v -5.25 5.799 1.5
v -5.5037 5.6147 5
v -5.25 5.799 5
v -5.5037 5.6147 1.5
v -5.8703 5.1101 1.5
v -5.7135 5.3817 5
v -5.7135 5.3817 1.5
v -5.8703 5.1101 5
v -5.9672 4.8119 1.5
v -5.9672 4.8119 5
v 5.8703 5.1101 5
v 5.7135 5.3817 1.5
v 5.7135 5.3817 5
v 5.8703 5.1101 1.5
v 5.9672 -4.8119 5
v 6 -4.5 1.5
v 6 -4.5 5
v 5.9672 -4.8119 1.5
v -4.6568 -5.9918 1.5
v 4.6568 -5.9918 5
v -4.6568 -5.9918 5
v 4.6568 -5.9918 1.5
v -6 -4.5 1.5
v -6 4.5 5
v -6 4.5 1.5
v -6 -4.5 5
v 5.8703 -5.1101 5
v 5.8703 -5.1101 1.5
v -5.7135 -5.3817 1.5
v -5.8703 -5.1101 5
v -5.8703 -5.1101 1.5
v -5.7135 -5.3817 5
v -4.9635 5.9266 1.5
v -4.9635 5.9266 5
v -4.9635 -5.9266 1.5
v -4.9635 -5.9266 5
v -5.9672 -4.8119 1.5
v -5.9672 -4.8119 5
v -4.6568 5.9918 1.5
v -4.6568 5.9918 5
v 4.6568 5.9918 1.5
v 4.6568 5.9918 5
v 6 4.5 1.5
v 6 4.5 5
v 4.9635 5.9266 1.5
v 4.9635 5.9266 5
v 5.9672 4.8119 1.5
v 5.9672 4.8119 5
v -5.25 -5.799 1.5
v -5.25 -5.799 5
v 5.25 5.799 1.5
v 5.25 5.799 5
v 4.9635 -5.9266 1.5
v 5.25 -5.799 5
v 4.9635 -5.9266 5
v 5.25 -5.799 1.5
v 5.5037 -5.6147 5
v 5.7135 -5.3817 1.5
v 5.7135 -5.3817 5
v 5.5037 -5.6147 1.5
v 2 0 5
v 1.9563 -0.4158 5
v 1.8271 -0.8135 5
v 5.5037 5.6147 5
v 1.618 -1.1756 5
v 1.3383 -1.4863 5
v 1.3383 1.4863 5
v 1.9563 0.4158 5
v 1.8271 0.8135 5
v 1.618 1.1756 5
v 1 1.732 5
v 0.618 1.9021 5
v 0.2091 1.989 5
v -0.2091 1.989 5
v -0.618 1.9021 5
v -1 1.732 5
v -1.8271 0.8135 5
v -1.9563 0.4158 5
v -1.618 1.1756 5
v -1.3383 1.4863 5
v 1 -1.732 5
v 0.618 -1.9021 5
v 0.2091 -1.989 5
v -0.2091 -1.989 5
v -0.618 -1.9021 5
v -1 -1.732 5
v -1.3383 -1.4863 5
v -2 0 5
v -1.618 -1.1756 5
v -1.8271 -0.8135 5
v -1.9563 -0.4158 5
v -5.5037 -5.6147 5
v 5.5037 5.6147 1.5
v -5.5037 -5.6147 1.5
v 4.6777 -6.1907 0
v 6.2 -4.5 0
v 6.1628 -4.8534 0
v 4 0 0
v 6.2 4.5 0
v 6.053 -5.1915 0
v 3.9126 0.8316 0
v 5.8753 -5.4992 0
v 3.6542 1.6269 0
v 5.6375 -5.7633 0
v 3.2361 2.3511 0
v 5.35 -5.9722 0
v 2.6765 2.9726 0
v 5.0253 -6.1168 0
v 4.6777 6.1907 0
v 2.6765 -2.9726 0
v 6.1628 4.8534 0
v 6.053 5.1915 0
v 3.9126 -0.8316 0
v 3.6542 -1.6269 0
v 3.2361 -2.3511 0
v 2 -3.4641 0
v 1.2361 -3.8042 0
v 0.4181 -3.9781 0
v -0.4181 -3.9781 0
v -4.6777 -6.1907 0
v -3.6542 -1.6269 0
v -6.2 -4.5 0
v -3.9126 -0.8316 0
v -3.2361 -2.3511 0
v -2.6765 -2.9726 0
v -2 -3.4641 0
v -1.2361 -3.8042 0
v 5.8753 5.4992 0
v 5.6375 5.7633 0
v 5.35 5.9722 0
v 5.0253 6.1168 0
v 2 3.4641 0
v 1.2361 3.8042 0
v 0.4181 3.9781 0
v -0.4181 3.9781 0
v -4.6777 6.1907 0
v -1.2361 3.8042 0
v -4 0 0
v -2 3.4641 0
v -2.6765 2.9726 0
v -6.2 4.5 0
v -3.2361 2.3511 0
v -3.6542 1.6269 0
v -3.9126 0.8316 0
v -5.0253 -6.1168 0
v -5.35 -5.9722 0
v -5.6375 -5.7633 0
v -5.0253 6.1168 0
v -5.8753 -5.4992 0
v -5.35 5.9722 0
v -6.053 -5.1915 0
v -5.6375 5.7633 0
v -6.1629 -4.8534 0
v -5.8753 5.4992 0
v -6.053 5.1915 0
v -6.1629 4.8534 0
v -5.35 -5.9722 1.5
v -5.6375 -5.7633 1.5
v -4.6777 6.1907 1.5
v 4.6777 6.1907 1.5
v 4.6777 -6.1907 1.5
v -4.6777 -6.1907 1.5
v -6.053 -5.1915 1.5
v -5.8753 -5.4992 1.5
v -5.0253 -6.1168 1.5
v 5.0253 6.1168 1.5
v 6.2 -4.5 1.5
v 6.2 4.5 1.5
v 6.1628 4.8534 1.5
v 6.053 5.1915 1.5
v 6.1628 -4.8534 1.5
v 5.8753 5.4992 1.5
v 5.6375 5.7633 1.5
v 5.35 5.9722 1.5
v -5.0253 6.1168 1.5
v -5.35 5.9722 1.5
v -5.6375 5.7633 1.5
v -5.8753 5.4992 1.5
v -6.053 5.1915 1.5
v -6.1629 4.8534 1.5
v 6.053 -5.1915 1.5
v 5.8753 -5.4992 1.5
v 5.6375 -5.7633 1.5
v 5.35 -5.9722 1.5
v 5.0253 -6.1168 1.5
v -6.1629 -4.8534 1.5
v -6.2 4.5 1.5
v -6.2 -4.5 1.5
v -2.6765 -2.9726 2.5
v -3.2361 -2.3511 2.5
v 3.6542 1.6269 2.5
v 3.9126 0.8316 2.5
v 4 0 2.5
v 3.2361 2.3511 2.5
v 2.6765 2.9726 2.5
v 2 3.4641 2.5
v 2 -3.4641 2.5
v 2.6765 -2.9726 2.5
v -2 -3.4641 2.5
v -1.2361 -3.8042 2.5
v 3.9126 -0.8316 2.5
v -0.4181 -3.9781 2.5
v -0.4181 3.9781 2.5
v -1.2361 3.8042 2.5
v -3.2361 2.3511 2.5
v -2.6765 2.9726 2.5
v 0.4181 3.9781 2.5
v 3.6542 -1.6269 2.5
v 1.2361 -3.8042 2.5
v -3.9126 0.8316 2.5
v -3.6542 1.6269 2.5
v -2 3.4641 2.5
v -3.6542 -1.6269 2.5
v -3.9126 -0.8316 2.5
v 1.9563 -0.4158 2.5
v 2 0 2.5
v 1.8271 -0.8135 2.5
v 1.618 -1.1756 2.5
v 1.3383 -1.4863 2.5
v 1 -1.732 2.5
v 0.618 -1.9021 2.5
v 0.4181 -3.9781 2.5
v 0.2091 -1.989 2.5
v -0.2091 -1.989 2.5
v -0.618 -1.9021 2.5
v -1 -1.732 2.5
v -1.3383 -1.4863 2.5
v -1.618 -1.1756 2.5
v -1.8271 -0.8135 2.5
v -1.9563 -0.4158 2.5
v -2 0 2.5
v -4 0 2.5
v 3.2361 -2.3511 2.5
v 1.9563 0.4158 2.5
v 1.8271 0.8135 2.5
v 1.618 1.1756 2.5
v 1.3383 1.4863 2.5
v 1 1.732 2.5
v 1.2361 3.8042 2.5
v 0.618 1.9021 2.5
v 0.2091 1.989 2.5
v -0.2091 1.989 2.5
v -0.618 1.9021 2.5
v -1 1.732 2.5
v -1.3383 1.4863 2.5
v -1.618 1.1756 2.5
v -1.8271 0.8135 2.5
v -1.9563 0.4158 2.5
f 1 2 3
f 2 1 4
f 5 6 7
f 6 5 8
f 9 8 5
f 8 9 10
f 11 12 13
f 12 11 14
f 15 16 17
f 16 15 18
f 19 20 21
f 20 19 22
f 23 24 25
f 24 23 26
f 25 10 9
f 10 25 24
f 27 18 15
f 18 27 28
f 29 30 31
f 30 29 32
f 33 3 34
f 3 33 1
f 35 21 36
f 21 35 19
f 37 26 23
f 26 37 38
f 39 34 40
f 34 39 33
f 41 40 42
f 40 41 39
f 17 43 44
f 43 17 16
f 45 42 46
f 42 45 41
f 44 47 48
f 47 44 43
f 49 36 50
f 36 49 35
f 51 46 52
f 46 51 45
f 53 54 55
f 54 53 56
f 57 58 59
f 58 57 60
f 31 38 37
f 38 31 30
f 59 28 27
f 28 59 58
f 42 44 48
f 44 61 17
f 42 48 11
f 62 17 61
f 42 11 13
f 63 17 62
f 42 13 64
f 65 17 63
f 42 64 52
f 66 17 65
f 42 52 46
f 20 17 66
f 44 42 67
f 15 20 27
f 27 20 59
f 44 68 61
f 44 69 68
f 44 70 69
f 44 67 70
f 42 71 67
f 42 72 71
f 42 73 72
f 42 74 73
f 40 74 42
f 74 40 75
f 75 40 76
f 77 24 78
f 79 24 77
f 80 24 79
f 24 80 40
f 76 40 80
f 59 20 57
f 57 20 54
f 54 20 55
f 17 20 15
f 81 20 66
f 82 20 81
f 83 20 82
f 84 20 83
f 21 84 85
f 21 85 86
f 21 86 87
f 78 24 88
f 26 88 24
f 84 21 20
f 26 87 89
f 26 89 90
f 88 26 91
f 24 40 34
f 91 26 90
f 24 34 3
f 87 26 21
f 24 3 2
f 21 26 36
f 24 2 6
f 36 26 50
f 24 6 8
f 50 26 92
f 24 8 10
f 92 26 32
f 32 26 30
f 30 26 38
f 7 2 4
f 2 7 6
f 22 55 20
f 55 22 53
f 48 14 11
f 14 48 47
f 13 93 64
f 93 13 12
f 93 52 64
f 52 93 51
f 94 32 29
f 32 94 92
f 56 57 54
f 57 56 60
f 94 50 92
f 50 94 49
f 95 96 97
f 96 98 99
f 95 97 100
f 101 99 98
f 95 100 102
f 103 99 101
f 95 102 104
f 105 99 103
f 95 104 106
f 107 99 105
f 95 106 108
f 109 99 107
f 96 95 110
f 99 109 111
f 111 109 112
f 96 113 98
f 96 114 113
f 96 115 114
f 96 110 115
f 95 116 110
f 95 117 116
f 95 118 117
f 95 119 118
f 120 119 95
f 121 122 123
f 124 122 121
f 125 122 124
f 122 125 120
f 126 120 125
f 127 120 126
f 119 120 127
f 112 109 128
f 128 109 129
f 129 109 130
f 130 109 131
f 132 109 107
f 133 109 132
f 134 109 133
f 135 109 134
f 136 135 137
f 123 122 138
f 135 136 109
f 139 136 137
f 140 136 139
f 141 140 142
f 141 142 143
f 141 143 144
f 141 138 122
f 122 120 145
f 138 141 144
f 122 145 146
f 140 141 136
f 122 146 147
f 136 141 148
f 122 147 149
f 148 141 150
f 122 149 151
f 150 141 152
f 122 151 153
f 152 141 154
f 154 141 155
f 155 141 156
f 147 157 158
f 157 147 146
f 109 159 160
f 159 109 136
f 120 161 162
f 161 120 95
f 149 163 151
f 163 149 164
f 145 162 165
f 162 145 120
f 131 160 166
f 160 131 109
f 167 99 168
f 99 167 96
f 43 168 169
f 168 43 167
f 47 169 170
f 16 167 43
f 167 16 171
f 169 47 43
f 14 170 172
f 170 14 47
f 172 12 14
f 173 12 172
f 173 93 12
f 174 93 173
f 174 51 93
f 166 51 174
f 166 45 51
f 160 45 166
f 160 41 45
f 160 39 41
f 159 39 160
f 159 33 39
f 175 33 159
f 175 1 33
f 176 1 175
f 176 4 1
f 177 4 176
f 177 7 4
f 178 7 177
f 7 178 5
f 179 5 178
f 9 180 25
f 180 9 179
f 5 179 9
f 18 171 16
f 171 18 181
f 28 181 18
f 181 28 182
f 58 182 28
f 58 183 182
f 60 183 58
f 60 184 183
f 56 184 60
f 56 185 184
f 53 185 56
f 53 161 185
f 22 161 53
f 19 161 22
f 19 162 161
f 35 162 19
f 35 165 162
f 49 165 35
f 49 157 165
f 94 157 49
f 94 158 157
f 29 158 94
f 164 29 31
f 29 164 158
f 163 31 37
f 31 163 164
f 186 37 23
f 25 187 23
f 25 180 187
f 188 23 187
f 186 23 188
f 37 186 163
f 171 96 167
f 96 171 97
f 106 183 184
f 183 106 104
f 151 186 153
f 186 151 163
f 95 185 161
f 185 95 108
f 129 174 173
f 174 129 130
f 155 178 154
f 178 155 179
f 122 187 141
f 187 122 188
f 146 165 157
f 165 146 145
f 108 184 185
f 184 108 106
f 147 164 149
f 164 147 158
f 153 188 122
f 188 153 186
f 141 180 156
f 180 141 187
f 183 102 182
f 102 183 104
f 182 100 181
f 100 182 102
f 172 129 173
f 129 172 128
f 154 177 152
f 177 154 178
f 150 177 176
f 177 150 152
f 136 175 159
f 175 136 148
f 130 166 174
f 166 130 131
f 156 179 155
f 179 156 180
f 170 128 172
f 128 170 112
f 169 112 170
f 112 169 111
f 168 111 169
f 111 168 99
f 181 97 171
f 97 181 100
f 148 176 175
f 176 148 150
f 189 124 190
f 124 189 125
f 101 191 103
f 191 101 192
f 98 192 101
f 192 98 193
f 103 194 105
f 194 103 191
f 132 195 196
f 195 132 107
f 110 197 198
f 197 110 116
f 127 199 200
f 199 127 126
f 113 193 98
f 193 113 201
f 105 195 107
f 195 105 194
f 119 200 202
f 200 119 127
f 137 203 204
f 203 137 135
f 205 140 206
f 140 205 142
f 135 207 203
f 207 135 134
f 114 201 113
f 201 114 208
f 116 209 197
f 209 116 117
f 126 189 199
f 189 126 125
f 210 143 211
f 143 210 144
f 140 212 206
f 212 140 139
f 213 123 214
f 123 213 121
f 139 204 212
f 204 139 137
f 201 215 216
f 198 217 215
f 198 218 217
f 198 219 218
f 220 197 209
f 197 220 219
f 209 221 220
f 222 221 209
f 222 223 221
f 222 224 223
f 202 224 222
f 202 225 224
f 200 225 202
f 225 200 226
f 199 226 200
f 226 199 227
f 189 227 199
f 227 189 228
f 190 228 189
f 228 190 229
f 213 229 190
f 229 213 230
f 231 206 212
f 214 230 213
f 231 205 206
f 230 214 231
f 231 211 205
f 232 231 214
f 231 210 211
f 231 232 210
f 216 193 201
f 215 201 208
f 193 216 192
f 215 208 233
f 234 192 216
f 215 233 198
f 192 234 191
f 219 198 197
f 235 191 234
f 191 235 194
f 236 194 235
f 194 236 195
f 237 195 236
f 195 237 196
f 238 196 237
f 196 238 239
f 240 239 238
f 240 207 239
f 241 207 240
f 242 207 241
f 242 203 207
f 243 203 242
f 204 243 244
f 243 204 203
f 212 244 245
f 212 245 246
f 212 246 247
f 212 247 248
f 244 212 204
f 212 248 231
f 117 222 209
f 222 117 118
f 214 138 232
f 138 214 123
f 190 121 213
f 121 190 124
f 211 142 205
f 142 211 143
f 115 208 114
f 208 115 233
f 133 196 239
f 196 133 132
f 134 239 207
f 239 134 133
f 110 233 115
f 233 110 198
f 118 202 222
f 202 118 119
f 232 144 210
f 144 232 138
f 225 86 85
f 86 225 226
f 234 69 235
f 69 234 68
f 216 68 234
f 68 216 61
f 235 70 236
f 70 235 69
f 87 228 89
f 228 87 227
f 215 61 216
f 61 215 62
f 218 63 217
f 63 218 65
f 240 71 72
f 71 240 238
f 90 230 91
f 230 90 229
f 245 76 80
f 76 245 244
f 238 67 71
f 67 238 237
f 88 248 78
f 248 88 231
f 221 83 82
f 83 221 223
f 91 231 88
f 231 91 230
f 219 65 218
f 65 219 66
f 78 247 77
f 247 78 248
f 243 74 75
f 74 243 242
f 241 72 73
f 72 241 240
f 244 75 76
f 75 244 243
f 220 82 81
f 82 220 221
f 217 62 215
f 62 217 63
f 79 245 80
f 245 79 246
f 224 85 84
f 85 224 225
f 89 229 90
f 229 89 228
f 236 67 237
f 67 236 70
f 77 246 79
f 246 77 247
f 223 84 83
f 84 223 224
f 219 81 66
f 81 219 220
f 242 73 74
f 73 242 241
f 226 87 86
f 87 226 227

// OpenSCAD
// rounded edges on the sides, square-edged top and bottom face
module mono_rounded_cube(dimensions = [200, 150, 300], radius = 3, $fn = 30) {
    minkowski() {
        translate([radius, radius, 0]) {
            cube([dimensions[0] - (radius *  2), dimensions[1] - (radius * 2), dimensions[2] - 1]);
        }
        cylinder(r = radius, h = 1);
    }
}

difference() {
    union() {
        translate([-6, -6, 0]) mono_rounded_cube(dimensions = [12,12,5], radius = 1.5);
        translate([-6.2, -6.2, 0]) mono_rounded_cube(dimensions = [12.4, 12.4, 1.5], radius = 1.7);
    }
    union() {
        cylinder(r = 4, h = 2.5, $fn = 30);
        cylinder(r = 2, h = 6, $fn = 30);
    }
}
